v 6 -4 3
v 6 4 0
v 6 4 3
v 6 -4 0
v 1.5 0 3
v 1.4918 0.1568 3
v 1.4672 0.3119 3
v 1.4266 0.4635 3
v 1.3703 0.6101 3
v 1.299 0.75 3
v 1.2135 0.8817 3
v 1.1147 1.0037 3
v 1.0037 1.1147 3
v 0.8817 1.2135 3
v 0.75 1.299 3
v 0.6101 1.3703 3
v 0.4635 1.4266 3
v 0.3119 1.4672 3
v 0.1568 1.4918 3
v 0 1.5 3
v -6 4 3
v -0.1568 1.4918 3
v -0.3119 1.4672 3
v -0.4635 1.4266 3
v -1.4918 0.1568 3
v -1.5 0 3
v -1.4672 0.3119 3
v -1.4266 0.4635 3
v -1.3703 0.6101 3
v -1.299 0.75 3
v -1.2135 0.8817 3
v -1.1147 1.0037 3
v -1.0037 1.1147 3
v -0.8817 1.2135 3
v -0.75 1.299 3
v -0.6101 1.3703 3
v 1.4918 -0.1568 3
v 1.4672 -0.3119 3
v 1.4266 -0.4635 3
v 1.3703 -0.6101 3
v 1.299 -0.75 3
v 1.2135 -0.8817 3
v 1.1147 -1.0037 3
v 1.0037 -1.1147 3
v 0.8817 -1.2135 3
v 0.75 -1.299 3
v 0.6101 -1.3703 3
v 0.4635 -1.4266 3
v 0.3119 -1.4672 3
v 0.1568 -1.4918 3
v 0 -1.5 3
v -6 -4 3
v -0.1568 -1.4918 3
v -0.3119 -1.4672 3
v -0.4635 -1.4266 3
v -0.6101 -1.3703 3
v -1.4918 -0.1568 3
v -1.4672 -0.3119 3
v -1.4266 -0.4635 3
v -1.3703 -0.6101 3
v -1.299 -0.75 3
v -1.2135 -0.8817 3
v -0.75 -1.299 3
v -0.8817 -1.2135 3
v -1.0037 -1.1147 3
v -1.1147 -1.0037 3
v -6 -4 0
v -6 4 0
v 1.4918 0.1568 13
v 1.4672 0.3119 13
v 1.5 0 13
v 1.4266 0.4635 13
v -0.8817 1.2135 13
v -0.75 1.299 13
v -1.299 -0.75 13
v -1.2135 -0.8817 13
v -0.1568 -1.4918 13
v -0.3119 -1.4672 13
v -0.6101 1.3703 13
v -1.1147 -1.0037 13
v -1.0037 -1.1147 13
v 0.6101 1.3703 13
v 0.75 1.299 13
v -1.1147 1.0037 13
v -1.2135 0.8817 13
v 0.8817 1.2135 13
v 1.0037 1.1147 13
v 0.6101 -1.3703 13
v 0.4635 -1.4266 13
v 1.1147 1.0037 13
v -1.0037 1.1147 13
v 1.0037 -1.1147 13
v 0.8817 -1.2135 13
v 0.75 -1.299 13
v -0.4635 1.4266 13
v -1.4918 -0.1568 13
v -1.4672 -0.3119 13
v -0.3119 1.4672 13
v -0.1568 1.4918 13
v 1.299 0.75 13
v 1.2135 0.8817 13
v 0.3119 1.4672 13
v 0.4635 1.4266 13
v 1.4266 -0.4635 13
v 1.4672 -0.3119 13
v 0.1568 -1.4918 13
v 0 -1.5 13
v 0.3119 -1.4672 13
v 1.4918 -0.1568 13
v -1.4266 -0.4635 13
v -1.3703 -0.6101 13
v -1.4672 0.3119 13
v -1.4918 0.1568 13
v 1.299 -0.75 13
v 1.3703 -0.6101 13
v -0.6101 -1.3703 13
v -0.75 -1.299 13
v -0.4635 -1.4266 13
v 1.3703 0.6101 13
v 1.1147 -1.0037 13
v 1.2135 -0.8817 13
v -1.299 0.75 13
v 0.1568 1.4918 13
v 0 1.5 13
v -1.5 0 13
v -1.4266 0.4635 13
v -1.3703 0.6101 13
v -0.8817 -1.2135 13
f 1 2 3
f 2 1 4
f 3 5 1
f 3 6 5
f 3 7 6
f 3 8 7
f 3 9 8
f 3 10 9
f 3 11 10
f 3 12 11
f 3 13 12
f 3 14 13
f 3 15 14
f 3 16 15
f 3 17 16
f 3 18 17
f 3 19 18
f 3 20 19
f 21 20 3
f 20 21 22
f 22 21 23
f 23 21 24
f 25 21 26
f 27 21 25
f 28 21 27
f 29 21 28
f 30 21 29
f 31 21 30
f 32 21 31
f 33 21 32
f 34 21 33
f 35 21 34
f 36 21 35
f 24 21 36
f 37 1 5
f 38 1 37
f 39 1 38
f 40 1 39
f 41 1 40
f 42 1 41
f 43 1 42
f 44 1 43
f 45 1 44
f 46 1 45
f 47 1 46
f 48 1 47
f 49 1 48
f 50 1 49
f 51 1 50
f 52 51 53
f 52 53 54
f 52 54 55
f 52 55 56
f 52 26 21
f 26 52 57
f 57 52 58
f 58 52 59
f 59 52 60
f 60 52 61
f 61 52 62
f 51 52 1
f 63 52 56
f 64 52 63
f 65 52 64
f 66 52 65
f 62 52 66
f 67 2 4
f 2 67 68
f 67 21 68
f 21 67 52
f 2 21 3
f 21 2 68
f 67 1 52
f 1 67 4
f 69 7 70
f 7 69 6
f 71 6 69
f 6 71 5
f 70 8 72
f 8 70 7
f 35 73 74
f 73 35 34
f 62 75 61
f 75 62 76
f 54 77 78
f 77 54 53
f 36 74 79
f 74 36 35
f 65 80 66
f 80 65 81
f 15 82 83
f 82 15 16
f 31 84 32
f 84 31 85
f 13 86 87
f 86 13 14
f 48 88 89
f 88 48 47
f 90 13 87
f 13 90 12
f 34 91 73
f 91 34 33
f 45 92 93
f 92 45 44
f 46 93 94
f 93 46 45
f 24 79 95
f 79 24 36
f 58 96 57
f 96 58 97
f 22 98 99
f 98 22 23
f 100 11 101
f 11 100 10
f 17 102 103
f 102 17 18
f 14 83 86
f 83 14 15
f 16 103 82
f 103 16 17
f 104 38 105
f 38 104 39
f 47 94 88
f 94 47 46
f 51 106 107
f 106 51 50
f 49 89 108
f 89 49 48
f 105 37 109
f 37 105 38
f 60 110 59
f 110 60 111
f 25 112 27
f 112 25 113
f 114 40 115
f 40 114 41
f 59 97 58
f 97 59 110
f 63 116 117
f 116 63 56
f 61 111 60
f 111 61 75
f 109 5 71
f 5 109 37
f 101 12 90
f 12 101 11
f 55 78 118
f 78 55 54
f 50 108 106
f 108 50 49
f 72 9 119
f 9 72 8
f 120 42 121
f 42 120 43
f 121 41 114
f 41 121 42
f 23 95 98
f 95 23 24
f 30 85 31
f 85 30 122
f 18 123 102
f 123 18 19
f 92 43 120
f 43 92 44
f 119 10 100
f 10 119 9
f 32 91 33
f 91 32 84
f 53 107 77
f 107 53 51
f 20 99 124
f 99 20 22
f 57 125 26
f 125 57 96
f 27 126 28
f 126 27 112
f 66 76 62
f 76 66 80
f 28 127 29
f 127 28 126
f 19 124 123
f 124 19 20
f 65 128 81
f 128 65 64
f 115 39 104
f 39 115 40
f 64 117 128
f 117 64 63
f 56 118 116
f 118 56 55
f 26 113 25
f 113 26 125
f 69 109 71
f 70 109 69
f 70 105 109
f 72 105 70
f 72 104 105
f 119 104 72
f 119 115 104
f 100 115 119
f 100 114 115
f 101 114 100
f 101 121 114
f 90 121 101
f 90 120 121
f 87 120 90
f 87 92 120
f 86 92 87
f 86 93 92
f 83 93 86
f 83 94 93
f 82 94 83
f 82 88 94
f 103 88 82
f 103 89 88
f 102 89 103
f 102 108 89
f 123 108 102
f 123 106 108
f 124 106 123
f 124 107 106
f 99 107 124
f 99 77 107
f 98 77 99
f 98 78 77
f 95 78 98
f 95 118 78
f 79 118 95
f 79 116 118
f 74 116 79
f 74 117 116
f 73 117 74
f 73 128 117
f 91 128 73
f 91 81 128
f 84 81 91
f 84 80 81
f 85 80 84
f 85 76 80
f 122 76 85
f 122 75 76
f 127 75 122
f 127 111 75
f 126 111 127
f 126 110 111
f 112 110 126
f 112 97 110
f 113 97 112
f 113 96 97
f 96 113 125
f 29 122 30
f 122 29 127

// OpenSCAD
// T-head slot bolt.
$fn = 60;
eps = 0.02;
shaft_d = 3;
head_l = 12;
shaft_l = 10;
head_w = shaft_d + 5;
head_h = 3;
union() {
    translate([-head_l/2,-head_w/2,0]) cube([head_l,head_w,head_h]);
    translate([0,0,head_h]) cylinder(d=shaft_d,h=shaft_l);
}
